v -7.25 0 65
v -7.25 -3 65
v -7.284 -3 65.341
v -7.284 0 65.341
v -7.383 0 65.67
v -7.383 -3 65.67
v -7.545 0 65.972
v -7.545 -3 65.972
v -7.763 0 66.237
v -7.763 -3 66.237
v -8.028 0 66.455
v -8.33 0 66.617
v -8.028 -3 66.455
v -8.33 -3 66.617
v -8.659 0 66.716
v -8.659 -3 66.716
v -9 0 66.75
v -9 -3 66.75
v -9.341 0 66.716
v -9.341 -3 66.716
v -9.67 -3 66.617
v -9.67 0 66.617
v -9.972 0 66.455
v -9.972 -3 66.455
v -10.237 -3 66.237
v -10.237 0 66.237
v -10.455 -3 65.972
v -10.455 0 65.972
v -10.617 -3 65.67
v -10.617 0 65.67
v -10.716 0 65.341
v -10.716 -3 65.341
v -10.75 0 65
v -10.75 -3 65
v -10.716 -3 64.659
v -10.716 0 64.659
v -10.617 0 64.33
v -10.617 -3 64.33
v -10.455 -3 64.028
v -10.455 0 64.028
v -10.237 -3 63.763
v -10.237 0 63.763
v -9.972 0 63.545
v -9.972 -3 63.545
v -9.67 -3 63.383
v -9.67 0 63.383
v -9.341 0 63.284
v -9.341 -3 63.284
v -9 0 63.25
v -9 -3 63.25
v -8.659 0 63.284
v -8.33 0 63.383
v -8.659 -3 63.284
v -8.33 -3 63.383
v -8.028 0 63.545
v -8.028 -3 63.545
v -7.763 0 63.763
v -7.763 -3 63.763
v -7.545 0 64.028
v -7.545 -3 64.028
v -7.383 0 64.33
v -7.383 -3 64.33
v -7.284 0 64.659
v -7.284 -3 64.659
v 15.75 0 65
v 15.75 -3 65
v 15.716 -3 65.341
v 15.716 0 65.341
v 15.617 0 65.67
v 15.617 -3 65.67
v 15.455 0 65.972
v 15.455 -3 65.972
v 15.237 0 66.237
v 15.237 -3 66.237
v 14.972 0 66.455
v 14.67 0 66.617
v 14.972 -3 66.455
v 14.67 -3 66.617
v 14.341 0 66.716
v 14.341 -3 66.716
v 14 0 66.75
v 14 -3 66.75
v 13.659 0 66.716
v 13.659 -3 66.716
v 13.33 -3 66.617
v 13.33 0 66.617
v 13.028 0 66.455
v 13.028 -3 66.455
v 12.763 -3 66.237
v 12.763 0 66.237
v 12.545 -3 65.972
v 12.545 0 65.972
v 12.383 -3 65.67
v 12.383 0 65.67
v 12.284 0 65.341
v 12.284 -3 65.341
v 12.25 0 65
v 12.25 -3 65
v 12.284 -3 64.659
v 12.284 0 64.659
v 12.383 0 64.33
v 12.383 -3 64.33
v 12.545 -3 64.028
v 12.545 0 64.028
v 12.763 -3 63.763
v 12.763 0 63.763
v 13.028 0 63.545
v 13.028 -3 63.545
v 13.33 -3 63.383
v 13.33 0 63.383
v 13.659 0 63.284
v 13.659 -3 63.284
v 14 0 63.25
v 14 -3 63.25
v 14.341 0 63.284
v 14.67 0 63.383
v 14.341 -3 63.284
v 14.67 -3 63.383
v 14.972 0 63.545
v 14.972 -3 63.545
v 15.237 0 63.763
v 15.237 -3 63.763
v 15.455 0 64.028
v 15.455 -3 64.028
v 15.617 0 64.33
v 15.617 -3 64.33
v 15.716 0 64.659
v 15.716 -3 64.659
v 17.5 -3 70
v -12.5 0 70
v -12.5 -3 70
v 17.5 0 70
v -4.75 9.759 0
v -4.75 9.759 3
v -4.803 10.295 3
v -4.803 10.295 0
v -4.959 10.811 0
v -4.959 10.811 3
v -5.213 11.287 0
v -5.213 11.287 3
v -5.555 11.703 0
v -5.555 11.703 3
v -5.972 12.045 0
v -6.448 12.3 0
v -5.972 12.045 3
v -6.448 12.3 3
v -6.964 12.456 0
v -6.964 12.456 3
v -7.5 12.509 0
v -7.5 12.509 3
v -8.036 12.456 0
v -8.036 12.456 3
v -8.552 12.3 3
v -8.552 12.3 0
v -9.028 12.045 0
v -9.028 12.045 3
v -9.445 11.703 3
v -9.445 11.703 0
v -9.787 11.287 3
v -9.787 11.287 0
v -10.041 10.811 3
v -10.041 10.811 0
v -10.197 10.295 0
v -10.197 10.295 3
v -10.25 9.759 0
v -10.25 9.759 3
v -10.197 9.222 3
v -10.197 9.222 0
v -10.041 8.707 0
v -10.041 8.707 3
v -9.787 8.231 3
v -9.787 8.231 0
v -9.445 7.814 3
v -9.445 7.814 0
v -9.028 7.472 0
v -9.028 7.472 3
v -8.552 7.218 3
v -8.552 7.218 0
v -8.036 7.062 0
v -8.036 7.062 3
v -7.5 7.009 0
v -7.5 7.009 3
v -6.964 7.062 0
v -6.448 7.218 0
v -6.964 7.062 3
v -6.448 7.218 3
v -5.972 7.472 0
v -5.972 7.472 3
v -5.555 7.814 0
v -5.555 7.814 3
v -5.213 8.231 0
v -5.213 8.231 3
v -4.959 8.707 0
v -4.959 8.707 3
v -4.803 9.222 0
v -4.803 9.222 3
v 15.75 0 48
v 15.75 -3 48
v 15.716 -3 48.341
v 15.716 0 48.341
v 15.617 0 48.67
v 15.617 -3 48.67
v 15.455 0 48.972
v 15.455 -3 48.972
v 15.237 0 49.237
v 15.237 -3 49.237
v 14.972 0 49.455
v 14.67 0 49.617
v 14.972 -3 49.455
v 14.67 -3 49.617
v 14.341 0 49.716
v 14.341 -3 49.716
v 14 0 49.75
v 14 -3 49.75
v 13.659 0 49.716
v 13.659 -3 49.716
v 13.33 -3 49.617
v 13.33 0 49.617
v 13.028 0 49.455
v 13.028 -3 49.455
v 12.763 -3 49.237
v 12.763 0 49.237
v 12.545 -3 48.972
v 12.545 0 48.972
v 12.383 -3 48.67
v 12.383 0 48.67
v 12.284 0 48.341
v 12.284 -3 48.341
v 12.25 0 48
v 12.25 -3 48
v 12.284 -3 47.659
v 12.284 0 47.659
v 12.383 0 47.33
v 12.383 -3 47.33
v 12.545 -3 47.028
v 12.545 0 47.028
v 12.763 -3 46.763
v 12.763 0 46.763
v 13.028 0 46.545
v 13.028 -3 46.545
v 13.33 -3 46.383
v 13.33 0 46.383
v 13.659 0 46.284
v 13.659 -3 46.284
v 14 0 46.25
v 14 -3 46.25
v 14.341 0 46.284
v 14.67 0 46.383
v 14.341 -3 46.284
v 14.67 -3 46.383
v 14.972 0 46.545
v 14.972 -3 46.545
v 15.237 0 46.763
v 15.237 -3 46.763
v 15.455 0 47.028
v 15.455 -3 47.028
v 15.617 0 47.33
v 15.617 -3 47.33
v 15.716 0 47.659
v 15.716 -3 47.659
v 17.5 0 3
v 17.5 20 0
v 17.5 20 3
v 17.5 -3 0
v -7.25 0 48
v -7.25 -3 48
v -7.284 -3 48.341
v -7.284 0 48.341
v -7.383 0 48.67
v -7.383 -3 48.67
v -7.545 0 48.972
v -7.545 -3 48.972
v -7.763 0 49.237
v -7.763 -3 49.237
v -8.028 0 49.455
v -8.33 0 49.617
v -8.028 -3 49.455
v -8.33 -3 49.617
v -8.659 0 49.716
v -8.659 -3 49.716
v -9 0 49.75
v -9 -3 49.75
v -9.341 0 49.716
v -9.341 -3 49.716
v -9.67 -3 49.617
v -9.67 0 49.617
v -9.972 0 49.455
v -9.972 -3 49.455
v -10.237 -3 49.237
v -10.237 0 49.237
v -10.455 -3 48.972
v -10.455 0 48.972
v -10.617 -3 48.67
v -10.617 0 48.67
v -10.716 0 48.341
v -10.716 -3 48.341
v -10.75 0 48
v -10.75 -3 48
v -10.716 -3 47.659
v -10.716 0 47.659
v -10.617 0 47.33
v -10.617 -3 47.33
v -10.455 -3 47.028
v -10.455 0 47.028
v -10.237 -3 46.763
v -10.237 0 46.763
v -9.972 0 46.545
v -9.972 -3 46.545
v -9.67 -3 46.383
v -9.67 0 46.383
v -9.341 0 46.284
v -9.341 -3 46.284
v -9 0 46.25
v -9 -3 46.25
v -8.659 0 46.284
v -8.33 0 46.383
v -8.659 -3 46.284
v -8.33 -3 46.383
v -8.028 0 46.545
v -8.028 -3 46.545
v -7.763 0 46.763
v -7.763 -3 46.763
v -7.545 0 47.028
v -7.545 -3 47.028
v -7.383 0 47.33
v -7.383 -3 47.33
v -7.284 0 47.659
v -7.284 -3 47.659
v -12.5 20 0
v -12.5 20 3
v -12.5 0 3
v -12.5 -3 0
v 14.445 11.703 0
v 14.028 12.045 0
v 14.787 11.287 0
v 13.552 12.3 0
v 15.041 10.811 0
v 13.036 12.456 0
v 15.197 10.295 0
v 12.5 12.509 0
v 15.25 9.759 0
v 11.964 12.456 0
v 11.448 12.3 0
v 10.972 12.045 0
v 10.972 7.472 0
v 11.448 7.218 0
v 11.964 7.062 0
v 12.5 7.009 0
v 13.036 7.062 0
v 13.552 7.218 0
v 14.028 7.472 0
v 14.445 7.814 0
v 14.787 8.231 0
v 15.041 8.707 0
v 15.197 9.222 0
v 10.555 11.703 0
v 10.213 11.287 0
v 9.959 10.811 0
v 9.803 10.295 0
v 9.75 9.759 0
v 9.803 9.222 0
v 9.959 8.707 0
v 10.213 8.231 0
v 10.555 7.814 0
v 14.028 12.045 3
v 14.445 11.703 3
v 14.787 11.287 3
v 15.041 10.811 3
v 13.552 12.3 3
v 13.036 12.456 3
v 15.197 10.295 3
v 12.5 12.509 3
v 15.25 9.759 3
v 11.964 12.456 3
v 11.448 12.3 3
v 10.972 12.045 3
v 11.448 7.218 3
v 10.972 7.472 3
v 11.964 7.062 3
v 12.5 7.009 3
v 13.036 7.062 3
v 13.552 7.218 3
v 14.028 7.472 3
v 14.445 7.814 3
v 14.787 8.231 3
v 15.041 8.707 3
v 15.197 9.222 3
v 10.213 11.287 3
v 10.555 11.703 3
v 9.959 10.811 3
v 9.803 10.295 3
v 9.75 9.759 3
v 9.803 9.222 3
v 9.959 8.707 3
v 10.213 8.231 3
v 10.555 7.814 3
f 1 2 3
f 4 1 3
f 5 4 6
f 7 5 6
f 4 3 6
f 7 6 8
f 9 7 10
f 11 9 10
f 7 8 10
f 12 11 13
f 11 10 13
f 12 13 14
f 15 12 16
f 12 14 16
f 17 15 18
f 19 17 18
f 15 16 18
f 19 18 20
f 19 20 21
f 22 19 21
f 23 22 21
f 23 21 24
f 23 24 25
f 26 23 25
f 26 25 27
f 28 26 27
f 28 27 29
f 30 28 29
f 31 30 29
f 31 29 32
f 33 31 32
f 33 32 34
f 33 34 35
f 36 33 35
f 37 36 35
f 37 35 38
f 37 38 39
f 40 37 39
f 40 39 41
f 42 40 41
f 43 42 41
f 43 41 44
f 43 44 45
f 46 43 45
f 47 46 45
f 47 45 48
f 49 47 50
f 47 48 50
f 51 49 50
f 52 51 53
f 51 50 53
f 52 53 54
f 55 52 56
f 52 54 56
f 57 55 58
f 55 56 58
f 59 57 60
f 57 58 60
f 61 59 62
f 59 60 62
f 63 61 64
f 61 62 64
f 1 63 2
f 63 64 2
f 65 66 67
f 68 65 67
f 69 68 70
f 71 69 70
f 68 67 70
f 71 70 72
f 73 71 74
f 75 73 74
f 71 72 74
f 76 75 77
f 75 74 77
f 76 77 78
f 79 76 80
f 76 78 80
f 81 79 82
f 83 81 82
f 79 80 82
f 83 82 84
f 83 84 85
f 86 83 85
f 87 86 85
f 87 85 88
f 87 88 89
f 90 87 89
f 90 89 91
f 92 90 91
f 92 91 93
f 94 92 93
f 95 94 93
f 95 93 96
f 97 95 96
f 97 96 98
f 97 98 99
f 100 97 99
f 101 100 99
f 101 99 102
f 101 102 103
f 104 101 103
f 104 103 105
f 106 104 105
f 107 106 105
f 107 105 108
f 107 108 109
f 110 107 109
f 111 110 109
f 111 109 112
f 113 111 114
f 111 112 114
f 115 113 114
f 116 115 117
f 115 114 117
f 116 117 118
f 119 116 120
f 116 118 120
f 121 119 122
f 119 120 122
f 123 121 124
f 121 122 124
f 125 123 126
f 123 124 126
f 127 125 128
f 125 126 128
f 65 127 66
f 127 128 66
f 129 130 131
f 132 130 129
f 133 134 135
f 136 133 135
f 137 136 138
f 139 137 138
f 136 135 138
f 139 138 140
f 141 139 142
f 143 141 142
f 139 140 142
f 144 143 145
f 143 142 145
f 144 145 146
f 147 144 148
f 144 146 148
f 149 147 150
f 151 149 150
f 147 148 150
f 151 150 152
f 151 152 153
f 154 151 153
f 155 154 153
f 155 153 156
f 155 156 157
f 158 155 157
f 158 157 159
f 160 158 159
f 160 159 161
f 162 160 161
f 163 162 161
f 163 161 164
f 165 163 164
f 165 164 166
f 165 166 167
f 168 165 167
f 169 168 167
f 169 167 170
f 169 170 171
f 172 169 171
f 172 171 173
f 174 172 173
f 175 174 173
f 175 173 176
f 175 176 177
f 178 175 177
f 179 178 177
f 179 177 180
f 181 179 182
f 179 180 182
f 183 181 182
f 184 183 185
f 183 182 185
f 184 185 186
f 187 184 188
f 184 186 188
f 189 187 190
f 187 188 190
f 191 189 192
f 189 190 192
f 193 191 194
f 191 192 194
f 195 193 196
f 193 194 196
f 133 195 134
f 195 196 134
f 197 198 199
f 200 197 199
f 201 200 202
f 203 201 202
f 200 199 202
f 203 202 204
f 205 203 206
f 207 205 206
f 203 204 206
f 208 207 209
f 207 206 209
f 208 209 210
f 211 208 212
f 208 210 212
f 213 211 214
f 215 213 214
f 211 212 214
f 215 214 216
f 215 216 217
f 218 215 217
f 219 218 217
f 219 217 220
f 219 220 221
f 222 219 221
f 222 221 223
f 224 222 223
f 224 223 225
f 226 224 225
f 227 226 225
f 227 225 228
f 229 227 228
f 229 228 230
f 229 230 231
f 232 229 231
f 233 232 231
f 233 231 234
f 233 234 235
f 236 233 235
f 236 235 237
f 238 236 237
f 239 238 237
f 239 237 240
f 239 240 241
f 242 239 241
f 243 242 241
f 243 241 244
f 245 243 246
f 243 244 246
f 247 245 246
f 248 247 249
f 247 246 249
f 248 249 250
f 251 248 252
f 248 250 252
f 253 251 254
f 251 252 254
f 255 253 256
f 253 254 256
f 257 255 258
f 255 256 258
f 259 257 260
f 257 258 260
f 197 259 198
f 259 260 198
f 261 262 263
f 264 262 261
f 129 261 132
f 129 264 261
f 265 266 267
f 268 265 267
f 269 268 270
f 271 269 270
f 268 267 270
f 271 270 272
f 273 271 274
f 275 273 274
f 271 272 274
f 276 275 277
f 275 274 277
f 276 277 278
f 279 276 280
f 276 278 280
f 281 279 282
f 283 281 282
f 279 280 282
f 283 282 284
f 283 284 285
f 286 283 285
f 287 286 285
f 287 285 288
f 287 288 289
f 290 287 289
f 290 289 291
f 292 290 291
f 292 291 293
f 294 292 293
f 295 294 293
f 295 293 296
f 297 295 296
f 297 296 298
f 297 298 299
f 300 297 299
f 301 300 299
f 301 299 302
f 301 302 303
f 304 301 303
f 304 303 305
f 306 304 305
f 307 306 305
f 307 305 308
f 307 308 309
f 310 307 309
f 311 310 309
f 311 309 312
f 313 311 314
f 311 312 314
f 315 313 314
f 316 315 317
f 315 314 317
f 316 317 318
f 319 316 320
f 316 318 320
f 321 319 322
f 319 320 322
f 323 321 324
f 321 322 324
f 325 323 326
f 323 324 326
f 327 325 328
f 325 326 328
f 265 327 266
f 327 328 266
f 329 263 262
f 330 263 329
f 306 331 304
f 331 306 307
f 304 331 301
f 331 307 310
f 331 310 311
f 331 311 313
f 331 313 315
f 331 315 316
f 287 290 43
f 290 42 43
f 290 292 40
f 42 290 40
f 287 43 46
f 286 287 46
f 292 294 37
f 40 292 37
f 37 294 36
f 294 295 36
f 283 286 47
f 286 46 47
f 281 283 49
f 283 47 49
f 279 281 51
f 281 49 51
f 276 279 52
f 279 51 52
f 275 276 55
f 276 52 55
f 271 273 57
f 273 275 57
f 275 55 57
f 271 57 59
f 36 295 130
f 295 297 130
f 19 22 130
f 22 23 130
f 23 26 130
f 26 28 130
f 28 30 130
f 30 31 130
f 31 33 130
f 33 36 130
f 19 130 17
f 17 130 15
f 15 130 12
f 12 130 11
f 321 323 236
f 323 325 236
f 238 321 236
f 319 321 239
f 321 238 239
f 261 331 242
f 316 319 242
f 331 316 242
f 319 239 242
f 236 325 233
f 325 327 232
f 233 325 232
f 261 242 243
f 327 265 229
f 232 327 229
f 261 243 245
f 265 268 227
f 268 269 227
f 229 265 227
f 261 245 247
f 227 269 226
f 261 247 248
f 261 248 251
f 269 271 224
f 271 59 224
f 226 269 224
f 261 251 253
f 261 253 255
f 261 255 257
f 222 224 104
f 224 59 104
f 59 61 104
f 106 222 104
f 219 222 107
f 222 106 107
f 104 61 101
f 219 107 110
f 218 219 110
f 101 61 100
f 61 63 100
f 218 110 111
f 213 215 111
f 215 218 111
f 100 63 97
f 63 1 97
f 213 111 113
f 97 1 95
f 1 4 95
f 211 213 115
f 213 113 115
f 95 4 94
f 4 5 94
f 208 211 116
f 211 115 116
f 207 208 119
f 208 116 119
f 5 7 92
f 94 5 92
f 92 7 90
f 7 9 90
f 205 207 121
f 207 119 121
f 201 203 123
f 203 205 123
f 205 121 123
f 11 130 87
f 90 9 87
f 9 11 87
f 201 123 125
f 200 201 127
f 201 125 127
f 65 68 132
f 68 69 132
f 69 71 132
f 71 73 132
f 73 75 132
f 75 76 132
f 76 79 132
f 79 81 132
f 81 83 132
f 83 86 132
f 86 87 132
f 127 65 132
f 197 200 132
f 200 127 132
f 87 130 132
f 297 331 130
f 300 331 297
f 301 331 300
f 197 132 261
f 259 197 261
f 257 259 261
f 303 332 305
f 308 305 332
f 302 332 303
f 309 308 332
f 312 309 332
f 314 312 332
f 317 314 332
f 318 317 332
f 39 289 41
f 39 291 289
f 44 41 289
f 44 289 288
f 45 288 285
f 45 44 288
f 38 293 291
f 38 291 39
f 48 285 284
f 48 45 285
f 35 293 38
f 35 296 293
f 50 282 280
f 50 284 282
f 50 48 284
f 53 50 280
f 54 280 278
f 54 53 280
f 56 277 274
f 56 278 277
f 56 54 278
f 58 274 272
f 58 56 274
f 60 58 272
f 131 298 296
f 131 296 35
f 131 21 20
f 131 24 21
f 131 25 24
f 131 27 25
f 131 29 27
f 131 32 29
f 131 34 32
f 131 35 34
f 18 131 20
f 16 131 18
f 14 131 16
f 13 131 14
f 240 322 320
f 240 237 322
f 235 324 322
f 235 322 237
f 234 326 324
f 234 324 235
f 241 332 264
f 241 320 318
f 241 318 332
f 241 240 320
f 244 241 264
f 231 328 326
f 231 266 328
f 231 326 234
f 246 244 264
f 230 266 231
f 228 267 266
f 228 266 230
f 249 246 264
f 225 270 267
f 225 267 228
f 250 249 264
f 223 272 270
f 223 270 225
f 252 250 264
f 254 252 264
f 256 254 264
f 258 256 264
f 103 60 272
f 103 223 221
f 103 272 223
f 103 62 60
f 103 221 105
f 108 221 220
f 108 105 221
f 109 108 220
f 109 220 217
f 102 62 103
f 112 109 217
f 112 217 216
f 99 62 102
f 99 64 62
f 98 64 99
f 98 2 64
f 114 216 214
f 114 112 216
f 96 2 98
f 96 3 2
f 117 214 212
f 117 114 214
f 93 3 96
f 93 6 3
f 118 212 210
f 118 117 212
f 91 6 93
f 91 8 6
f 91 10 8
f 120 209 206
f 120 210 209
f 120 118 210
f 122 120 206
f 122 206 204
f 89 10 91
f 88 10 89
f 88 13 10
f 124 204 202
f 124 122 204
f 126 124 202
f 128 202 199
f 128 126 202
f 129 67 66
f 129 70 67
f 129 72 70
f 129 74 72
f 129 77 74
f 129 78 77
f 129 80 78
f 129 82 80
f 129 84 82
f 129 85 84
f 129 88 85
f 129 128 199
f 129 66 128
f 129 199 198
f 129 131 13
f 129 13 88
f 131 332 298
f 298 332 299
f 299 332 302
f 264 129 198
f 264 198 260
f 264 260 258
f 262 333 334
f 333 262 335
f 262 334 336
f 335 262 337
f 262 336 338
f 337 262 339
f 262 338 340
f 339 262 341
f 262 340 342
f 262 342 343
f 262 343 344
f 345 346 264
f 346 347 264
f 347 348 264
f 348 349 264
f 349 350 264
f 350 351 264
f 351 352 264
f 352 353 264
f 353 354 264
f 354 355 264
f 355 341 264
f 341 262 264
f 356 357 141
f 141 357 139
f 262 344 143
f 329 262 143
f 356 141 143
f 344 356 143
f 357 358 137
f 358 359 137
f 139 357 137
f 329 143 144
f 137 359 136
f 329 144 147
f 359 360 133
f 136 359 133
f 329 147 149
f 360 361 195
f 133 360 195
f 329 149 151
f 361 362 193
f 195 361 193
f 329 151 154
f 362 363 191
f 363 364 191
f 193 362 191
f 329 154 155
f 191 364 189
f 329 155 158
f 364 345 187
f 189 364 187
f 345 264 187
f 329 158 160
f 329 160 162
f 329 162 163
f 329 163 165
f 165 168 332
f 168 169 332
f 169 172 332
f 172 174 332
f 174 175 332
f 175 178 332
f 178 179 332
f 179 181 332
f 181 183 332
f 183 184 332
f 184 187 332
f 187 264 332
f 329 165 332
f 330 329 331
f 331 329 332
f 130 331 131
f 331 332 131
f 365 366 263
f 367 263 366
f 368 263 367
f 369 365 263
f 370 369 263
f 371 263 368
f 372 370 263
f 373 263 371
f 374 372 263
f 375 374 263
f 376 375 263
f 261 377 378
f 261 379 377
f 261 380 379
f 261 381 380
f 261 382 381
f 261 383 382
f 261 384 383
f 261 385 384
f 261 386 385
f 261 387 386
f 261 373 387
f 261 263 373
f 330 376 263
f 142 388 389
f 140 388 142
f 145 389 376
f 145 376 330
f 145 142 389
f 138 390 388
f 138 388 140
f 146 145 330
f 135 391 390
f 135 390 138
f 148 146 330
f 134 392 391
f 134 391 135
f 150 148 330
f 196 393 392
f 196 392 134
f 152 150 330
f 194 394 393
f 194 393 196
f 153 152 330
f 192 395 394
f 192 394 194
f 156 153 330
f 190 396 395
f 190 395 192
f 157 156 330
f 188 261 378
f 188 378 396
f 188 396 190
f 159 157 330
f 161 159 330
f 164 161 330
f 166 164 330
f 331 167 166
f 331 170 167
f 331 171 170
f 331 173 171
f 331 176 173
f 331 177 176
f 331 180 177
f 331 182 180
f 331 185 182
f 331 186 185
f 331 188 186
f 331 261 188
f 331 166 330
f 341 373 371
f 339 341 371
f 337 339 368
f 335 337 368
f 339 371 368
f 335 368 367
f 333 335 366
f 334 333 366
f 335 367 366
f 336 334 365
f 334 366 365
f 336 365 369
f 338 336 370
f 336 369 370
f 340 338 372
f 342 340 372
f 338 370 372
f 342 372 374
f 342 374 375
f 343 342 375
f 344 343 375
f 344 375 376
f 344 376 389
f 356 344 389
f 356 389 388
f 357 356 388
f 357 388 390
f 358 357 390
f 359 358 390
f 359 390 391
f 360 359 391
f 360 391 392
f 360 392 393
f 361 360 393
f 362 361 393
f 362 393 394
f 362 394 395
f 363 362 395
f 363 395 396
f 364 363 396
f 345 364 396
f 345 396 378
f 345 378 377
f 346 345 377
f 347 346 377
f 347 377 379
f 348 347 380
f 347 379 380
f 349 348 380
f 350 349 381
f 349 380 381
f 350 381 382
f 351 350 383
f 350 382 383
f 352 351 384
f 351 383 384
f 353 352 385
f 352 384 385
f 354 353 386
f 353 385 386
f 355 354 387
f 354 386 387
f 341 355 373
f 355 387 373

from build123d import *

# Parameters (mm, degrees)
F0_W     = 30
F0_H     = 70
F1_DEPTH = 3
F2_W     = 30
F2_H     = 3
F3_DEPTH = 20
F4_R     = 2.75
F5_DEPTH = 3.001
F6_R     = 1.75
F7_DEPTH = 23.001


with BuildPart() as f1:
    # F0 (on Front) → F1 (new body)
    with BuildSketch(Plane.XZ):
        with Locations((2.5, 35)):
            Rectangle(F0_W, F0_H)
    extrude(amount=F1_DEPTH)

    # F2 (on face) → F3 (join)
    with BuildSketch(Plane(origin=(0, 0, 0), x_dir=(-1, 0, 0), z_dir=(0, 1, 0))):
        with Locations((-2.5, 1.5)):
            Rectangle(F2_W, F2_H)
    extrude(amount=F3_DEPTH)

    # F4 (on face) → F5 (cut, through all)
    with BuildSketch(Plane.XY.offset(3)):
        with Locations((12.5, 9.75894)):
            Circle(F4_R)
        with Locations((-7.5, 9.75894)):
            Circle(F4_R)
    extrude(amount=-F5_DEPTH, mode=Mode.SUBTRACT)

    # F6 (on face) → F7 (cut, through all)
    with BuildSketch(Plane.XZ.offset(3)):
        with Locations((-9, 65)):
            Circle(F6_R)
        with Locations((-9, 48)):
            Circle(F6_R)
        with Locations((14, 65)):
            Circle(F6_R)
        with Locations((14, 48)):
            Circle(F6_R)
    extrude(amount=-F7_DEPTH, mode=Mode.SUBTRACT)


solid = f1.part
